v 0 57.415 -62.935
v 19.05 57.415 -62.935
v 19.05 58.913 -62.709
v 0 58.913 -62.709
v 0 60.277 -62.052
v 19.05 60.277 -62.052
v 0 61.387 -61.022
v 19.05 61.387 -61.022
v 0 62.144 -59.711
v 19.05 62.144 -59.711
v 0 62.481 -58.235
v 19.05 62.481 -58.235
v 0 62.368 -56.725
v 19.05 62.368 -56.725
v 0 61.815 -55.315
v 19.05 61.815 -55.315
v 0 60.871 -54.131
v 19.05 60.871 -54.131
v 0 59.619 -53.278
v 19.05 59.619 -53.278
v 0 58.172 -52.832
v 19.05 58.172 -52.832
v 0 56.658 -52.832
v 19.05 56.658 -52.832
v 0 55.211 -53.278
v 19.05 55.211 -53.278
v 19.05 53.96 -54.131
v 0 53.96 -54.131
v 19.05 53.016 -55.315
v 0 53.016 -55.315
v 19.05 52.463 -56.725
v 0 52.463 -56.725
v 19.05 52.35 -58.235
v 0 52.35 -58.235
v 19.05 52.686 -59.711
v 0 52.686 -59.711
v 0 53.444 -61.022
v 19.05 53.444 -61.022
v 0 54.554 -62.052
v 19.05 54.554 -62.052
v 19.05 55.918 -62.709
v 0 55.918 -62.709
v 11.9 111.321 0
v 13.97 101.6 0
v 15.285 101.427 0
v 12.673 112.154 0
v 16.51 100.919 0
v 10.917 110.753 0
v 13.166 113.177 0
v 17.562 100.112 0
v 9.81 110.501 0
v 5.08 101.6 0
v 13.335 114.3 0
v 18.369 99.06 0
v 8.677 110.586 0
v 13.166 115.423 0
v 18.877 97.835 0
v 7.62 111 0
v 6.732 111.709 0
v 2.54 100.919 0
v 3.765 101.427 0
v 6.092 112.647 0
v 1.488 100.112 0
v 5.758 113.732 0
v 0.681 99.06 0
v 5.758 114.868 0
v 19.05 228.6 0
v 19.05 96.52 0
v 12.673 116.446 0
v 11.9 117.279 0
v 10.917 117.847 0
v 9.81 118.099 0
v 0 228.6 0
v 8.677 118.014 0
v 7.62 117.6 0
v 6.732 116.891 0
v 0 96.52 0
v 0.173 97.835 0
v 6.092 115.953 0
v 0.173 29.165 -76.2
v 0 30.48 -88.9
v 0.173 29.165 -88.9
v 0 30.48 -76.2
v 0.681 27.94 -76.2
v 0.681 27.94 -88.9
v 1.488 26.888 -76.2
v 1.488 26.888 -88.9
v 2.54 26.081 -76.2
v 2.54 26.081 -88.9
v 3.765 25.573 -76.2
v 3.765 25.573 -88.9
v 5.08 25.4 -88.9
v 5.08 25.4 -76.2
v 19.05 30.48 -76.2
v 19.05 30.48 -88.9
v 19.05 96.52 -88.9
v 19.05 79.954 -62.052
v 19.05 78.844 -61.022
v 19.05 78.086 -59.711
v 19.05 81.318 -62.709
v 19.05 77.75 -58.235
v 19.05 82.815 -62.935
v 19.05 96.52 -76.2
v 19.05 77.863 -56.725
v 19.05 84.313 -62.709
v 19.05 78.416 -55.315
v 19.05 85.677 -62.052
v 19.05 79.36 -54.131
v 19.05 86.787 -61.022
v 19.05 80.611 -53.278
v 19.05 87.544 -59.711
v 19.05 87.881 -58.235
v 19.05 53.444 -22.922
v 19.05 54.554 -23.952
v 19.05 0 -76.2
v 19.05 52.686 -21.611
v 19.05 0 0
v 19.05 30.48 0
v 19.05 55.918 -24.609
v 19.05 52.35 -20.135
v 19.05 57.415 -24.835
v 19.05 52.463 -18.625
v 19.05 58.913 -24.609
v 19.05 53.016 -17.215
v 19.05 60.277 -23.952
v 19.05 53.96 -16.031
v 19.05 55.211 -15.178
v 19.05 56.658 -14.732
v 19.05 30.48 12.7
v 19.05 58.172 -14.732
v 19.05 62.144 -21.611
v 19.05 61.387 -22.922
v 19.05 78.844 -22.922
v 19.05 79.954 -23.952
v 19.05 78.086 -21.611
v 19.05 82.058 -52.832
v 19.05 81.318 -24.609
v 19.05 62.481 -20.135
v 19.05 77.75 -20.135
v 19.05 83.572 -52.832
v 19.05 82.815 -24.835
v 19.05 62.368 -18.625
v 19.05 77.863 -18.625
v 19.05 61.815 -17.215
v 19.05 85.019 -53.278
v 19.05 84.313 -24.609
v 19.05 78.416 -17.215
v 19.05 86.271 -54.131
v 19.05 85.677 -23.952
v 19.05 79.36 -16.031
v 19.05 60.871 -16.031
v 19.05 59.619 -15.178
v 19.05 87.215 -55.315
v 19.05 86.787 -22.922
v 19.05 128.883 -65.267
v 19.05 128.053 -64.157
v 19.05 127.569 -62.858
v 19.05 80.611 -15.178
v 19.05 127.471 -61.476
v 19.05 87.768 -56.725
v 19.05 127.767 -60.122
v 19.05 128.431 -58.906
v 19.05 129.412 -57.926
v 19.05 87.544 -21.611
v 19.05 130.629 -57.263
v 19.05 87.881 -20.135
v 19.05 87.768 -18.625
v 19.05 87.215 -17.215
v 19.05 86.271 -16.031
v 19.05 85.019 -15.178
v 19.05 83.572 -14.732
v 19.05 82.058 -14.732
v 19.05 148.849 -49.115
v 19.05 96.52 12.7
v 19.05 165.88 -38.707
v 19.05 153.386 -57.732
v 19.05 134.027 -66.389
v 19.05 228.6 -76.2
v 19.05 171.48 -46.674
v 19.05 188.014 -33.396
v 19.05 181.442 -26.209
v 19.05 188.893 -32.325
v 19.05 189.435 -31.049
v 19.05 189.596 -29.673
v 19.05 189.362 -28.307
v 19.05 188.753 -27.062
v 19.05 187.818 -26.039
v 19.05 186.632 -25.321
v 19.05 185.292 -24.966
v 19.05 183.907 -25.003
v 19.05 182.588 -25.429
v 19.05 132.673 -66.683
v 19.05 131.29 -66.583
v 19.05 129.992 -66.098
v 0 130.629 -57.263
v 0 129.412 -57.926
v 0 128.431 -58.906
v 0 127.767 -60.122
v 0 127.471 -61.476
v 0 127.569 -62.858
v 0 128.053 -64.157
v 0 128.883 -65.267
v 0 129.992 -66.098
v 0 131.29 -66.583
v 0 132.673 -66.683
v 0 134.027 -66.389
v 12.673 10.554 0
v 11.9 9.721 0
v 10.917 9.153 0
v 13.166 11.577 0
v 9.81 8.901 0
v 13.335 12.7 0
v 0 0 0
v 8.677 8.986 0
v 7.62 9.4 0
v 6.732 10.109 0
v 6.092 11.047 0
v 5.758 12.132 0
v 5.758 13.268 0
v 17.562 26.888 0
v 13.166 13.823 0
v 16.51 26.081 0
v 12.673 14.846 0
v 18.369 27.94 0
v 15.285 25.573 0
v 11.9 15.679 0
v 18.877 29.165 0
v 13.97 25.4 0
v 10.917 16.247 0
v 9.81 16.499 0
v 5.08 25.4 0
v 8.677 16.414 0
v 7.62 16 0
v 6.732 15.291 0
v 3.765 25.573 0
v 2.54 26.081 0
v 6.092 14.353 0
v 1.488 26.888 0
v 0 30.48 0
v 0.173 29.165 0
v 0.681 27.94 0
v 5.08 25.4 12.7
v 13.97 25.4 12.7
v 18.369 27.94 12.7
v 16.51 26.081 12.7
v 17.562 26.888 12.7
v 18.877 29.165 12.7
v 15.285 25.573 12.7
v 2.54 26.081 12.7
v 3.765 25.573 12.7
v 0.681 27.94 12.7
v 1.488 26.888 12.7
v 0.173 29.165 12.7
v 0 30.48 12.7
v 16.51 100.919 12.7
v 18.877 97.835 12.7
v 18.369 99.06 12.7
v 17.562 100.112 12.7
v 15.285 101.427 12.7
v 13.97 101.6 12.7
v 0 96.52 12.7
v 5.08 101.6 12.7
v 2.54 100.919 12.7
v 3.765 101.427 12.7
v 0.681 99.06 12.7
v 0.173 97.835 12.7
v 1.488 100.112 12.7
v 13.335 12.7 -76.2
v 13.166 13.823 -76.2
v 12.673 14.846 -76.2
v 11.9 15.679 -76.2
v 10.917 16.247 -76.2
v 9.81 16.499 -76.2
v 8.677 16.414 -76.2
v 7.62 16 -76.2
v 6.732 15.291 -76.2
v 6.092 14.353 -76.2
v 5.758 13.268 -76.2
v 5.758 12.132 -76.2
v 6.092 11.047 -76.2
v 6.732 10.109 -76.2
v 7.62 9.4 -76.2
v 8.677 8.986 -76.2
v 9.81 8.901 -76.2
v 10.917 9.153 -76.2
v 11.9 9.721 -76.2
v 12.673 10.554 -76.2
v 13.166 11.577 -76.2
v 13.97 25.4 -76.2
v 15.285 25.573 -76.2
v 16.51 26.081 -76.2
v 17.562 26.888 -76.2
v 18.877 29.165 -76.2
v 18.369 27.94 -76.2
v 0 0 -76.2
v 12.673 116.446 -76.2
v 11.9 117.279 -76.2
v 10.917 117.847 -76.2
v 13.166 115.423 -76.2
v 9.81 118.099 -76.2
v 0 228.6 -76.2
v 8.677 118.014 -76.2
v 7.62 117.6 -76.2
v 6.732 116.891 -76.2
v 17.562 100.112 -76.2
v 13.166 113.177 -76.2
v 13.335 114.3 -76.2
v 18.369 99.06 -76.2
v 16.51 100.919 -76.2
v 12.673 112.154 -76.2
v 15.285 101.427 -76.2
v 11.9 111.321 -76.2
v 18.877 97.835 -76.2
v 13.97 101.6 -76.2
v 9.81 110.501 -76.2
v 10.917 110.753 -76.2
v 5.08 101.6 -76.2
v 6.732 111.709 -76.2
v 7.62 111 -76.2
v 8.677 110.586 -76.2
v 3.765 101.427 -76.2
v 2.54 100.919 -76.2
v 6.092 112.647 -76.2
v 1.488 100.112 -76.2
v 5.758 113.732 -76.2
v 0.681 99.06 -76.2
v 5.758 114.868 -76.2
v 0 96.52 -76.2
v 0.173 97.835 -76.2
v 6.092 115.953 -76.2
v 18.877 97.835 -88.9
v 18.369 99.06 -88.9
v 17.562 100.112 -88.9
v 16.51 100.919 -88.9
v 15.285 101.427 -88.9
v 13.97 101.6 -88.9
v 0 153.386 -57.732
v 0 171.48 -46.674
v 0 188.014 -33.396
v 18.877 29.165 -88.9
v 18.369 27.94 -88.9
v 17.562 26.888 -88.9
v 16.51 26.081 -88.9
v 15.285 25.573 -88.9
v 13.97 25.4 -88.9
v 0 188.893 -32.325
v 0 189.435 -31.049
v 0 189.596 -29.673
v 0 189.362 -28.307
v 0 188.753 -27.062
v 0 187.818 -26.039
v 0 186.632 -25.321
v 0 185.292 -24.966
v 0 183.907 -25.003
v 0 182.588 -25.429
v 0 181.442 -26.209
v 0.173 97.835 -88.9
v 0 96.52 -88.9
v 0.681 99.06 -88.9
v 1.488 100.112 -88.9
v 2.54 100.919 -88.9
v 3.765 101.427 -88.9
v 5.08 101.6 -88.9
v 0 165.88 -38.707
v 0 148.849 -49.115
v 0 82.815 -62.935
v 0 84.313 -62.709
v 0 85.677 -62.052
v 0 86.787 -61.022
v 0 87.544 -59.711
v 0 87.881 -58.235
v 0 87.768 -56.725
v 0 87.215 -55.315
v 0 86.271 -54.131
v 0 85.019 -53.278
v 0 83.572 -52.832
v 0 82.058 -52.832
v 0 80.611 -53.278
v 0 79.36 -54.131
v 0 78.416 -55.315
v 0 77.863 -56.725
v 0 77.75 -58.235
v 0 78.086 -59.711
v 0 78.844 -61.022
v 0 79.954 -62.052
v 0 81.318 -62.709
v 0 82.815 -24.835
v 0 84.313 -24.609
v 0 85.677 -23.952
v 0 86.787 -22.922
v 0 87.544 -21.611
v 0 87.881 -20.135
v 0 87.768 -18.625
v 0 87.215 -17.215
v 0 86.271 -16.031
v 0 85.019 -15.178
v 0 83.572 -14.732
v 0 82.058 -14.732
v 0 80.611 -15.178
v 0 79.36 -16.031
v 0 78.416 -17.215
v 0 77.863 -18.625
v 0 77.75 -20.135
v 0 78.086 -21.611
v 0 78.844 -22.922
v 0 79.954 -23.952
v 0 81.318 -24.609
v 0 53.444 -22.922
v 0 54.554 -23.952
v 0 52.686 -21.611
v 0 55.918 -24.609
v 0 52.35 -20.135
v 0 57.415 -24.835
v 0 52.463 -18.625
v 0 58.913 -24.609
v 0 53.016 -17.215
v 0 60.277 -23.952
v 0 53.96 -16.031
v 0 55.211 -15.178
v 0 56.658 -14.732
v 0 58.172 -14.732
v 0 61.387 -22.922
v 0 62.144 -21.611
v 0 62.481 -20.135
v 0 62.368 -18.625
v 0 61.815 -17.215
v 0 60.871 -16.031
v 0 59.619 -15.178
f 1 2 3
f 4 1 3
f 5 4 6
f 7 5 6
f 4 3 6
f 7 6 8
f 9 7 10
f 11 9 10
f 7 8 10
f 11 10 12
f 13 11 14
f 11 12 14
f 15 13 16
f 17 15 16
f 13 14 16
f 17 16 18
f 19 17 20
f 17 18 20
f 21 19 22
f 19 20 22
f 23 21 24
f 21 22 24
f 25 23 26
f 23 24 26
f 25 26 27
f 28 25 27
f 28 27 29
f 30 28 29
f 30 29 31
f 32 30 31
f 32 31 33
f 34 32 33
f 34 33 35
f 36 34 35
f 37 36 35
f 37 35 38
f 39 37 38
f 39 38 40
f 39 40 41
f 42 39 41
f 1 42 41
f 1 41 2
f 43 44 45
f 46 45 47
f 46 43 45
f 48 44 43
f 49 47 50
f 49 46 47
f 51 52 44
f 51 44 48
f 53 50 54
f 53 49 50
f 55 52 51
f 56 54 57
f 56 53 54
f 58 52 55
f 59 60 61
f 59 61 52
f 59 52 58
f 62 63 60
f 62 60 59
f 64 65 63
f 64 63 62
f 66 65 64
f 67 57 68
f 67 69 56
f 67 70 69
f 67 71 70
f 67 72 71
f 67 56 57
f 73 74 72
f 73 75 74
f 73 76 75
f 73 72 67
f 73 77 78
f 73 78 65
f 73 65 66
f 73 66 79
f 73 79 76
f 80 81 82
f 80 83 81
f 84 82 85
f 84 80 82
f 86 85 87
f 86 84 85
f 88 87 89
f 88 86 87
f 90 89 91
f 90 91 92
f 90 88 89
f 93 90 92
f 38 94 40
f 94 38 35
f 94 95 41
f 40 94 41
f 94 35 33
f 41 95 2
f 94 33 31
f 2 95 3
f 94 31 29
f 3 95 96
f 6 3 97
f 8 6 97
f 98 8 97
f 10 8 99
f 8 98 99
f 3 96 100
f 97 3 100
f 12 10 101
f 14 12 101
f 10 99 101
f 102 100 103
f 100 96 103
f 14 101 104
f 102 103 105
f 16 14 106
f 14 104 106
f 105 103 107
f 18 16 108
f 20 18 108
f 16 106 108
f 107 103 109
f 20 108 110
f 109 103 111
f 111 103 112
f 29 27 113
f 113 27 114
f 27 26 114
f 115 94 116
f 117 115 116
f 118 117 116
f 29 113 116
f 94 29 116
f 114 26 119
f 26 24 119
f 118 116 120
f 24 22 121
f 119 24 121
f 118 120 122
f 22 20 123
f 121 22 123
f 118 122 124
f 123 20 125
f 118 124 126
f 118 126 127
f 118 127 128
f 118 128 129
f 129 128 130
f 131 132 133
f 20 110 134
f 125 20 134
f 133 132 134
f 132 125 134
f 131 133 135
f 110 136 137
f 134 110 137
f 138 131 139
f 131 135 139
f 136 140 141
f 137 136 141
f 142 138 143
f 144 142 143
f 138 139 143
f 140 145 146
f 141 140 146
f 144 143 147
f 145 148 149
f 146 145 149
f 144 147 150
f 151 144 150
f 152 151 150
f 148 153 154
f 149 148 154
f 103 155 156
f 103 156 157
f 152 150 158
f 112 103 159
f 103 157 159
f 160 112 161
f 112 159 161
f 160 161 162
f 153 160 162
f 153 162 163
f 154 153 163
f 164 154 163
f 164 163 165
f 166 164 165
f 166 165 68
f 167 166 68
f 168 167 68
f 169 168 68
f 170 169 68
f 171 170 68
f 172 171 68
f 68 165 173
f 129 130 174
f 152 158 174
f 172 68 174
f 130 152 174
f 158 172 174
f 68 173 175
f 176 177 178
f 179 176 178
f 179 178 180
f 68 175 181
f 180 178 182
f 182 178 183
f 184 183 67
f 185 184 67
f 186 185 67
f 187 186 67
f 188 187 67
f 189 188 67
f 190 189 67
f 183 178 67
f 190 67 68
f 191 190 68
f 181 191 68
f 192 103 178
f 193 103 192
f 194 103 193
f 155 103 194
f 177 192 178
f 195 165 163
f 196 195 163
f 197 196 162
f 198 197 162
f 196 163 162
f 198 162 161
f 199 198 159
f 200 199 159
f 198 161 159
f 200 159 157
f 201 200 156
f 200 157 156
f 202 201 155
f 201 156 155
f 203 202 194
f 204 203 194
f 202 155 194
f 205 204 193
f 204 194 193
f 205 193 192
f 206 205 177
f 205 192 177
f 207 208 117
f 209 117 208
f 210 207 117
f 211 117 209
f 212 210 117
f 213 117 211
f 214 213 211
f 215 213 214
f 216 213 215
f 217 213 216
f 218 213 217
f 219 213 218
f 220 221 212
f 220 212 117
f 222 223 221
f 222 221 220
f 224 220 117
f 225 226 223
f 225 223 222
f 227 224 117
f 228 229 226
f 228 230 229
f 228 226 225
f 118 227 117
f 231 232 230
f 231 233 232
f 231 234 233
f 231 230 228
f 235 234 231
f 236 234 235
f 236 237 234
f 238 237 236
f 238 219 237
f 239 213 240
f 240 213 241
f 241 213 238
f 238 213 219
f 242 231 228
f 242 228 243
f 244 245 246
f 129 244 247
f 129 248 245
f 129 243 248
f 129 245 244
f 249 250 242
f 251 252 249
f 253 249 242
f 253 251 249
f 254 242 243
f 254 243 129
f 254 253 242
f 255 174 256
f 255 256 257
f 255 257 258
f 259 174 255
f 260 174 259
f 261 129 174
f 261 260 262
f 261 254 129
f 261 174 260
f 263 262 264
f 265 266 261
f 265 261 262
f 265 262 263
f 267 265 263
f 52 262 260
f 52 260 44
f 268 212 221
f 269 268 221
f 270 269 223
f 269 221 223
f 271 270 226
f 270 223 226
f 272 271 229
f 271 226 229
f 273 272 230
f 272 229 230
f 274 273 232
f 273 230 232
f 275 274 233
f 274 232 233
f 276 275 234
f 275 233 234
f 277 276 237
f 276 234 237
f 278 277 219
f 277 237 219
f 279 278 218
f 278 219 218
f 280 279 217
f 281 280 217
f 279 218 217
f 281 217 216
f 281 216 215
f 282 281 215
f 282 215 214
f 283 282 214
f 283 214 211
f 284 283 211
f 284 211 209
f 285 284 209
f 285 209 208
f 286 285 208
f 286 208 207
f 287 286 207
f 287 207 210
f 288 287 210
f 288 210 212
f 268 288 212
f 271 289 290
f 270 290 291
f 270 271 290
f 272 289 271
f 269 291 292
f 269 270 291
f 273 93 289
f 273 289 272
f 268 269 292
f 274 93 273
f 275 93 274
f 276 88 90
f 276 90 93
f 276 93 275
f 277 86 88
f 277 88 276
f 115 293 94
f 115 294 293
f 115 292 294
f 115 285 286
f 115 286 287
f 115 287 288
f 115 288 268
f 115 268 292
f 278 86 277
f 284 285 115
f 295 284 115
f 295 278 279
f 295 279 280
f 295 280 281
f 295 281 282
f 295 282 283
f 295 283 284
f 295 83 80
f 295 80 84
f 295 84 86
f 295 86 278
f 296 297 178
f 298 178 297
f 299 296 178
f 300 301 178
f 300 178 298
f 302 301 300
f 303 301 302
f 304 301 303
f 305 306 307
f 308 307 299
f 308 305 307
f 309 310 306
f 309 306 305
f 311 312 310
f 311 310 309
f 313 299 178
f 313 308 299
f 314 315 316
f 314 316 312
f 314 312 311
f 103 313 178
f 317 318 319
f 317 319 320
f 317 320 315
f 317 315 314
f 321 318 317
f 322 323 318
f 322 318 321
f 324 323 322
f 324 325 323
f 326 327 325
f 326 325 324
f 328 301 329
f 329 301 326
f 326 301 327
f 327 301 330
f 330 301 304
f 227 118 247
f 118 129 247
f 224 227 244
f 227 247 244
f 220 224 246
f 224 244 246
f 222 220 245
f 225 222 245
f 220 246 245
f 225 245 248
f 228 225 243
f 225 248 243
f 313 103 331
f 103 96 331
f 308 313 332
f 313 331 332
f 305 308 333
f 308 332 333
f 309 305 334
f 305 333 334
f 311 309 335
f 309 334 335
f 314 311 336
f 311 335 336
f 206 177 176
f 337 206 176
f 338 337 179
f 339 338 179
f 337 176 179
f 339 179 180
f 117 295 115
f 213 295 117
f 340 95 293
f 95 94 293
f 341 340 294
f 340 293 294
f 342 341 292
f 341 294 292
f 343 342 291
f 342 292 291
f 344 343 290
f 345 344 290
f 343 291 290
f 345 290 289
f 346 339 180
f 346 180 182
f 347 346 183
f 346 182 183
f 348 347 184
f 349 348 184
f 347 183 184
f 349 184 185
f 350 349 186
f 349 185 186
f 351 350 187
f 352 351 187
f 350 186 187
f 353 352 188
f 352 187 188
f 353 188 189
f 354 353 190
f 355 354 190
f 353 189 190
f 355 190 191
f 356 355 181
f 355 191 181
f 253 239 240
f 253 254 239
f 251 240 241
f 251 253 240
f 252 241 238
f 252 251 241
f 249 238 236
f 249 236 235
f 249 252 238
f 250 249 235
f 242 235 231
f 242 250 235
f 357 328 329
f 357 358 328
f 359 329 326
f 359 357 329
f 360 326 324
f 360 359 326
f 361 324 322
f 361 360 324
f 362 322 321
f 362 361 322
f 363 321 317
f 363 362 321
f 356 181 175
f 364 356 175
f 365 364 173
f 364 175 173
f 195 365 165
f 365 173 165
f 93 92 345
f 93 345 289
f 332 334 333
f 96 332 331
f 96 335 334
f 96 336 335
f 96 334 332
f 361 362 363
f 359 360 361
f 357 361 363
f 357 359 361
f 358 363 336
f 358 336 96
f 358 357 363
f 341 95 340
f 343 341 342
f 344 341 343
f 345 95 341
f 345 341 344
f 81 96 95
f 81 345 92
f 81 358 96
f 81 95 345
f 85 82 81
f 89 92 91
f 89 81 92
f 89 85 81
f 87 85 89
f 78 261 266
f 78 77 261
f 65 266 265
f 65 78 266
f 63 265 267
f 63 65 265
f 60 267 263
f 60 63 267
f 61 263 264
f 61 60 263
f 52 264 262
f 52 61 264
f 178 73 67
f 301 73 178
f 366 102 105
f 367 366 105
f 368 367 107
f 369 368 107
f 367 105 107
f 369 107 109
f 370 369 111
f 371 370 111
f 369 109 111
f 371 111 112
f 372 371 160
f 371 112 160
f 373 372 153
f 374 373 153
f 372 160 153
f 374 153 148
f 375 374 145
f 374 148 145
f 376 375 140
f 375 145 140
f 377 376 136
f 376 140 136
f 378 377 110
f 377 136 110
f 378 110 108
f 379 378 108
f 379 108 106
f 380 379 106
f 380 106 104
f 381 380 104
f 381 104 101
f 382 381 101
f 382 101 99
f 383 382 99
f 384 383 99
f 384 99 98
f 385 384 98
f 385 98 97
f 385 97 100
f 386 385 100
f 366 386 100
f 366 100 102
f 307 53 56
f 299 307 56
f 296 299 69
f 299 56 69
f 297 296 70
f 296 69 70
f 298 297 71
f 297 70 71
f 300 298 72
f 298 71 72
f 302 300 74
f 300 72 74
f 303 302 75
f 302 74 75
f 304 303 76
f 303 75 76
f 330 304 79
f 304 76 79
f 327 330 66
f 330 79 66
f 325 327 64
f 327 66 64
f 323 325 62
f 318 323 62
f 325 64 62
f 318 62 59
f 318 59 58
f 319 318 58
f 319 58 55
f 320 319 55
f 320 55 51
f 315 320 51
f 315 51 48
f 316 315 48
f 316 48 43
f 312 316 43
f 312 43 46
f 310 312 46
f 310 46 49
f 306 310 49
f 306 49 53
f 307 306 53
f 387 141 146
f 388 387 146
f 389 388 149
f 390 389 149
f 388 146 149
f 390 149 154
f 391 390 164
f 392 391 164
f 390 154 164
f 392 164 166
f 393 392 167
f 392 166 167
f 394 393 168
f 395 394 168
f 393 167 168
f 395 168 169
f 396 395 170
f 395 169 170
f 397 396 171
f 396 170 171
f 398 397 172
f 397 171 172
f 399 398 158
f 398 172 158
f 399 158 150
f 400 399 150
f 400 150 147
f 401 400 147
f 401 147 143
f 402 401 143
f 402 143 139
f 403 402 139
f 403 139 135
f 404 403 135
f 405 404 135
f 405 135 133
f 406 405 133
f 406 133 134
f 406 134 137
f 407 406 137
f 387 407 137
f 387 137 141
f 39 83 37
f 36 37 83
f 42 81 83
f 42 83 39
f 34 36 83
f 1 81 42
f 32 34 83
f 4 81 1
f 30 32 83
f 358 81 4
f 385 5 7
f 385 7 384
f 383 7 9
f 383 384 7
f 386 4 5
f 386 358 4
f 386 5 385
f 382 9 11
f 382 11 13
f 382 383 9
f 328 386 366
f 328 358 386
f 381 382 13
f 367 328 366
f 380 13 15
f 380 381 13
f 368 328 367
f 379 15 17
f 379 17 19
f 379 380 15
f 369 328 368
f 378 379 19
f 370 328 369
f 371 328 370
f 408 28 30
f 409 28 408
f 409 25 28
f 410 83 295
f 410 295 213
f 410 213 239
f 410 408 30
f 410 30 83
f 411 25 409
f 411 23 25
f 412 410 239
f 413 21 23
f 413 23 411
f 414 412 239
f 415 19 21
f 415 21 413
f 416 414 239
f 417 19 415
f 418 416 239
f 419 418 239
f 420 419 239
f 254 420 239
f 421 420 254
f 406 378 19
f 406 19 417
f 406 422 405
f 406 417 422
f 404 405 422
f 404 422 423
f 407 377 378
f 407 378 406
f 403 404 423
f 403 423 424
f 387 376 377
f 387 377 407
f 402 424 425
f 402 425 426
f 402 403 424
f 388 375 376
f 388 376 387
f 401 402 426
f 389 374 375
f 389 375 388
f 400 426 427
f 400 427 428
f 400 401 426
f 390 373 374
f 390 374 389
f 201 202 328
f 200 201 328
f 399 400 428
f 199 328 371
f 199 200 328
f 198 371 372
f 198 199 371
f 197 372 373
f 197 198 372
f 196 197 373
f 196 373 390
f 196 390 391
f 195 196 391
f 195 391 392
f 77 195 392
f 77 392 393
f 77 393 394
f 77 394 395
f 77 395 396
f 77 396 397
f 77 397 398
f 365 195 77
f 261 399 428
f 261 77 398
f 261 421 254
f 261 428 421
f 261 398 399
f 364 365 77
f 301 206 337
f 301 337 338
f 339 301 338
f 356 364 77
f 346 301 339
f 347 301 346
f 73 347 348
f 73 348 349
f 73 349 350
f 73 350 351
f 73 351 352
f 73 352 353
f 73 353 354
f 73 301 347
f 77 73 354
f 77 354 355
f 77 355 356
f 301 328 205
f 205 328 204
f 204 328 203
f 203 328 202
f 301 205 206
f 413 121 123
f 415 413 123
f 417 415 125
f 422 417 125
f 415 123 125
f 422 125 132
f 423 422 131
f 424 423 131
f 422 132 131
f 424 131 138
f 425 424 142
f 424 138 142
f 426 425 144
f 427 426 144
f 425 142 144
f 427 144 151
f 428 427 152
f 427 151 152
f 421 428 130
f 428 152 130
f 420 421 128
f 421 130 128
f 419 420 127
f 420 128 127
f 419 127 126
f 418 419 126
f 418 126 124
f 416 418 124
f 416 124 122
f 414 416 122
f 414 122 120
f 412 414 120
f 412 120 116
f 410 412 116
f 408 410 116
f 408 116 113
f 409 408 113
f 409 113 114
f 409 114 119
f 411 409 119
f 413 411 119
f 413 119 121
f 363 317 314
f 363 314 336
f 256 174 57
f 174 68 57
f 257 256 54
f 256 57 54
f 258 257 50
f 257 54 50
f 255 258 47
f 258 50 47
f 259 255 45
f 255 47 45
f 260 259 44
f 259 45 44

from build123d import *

# Parameters (mm, degrees)
BOSS_EXTRUDE1_DEPTH = 19.05
SKETCH2_R           = 3.81
CUT_EXTRUDE1_DEPTH  = 89.9
SKETCH3_R           = 3.81
CUT_EXTRUDE2_DEPTH  = 89.9
SKETCH4_R           = 5.08
CUT_EXTRUDE3_DEPTH  = 20.05
FILLET1_R           = 5.08


with BuildPart() as part:
    # Sketch1 → Boss-Extrude1 (new body)
    with BuildSketch(Plane(origin=(0, 0, 0), x_dir=(0, 0, -1), z_dir=(1, 0, 0))):
        Polygon((0, 0), (0, 25.4), (-12.7, 25.4), (-12.7, 101.6), (0, 101.6), (0, 228.6), (76.2, 228.6), (76.2, 101.6), (88.9, 101.6), (88.9, 25.4), (76.2, 25.4), (76.2, 0), align=None)
    extrude(amount=BOSS_EXTRUDE1_DEPTH)

    # Sketch2 → Cut-Extrude1 (cut, through all)
    with BuildSketch(Plane.XY):
        with Locations((9.525, 114.3)):
            Circle(SKETCH2_R)
    extrude(amount=-CUT_EXTRUDE1_DEPTH, mode=Mode.SUBTRACT)

    # Sketch3 → Cut-Extrude2 (cut, through all)
    with BuildSketch(Plane.XY):
        with Locations((9.525, 12.7)):
            Circle(SKETCH3_R)
    extrude(amount=-CUT_EXTRUDE2_DEPTH, mode=Mode.SUBTRACT)

    # Sketch4 → Cut-Extrude3 (cut, through all)
    with BuildSketch(Plane(origin=(19.05, 0, 0), x_dir=(0, 0, -1), z_dir=(1, 0, 0))):
        with Locations((19.755070015, 57.415301139)):
            Circle(SKETCH4_R)
        with Locations((57.855070015, 57.415301139)):
            Circle(SKETCH4_R)
        with Locations((19.755070015, 82.815301139)):
            Circle(SKETCH4_R)
        with Locations((57.855070015, 82.815301139)):
            Circle(SKETCH4_R)
        with BuildLine():
            ThreePointArc((66.388980032, 134.027277083), (52.493130024, 162.609745262), (33.396209532, 188.013677287))
            ThreePointArc((33.396209532, 188.013677287), (26.516800005, 188.321710549), (26.208766742, 181.442301021))
            ThreePointArc((26.208766742, 181.442301021), (44.183346452, 157.531377723), (57.262526611, 130.628723299))
            ThreePointArc((57.262526611, 130.628723299), (63.525030214, 127.76477348), (66.388980032, 134.027277083))
        make_face()
    extrude(amount=-CUT_EXTRUDE3_DEPTH, mode=Mode.SUBTRACT)

    # Fillet1
    fillet1_edges = [part.edges().sort_by_distance(p)[0] for p in [
        (19.05, 25.4, -82.55),
        (0, 25.4, 6.35),
        (0, 101.6, 6.35),
        (0, 101.6, -82.55),
        (0, 25.4, -82.55),
        (19.05, 101.6, -82.55),
        (19.05, 101.6, 6.35),
        (19.05, 25.4, 6.35),
    ]]
    fillet(fillet1_edges, radius=FILLET1_R)


solid = part.part
